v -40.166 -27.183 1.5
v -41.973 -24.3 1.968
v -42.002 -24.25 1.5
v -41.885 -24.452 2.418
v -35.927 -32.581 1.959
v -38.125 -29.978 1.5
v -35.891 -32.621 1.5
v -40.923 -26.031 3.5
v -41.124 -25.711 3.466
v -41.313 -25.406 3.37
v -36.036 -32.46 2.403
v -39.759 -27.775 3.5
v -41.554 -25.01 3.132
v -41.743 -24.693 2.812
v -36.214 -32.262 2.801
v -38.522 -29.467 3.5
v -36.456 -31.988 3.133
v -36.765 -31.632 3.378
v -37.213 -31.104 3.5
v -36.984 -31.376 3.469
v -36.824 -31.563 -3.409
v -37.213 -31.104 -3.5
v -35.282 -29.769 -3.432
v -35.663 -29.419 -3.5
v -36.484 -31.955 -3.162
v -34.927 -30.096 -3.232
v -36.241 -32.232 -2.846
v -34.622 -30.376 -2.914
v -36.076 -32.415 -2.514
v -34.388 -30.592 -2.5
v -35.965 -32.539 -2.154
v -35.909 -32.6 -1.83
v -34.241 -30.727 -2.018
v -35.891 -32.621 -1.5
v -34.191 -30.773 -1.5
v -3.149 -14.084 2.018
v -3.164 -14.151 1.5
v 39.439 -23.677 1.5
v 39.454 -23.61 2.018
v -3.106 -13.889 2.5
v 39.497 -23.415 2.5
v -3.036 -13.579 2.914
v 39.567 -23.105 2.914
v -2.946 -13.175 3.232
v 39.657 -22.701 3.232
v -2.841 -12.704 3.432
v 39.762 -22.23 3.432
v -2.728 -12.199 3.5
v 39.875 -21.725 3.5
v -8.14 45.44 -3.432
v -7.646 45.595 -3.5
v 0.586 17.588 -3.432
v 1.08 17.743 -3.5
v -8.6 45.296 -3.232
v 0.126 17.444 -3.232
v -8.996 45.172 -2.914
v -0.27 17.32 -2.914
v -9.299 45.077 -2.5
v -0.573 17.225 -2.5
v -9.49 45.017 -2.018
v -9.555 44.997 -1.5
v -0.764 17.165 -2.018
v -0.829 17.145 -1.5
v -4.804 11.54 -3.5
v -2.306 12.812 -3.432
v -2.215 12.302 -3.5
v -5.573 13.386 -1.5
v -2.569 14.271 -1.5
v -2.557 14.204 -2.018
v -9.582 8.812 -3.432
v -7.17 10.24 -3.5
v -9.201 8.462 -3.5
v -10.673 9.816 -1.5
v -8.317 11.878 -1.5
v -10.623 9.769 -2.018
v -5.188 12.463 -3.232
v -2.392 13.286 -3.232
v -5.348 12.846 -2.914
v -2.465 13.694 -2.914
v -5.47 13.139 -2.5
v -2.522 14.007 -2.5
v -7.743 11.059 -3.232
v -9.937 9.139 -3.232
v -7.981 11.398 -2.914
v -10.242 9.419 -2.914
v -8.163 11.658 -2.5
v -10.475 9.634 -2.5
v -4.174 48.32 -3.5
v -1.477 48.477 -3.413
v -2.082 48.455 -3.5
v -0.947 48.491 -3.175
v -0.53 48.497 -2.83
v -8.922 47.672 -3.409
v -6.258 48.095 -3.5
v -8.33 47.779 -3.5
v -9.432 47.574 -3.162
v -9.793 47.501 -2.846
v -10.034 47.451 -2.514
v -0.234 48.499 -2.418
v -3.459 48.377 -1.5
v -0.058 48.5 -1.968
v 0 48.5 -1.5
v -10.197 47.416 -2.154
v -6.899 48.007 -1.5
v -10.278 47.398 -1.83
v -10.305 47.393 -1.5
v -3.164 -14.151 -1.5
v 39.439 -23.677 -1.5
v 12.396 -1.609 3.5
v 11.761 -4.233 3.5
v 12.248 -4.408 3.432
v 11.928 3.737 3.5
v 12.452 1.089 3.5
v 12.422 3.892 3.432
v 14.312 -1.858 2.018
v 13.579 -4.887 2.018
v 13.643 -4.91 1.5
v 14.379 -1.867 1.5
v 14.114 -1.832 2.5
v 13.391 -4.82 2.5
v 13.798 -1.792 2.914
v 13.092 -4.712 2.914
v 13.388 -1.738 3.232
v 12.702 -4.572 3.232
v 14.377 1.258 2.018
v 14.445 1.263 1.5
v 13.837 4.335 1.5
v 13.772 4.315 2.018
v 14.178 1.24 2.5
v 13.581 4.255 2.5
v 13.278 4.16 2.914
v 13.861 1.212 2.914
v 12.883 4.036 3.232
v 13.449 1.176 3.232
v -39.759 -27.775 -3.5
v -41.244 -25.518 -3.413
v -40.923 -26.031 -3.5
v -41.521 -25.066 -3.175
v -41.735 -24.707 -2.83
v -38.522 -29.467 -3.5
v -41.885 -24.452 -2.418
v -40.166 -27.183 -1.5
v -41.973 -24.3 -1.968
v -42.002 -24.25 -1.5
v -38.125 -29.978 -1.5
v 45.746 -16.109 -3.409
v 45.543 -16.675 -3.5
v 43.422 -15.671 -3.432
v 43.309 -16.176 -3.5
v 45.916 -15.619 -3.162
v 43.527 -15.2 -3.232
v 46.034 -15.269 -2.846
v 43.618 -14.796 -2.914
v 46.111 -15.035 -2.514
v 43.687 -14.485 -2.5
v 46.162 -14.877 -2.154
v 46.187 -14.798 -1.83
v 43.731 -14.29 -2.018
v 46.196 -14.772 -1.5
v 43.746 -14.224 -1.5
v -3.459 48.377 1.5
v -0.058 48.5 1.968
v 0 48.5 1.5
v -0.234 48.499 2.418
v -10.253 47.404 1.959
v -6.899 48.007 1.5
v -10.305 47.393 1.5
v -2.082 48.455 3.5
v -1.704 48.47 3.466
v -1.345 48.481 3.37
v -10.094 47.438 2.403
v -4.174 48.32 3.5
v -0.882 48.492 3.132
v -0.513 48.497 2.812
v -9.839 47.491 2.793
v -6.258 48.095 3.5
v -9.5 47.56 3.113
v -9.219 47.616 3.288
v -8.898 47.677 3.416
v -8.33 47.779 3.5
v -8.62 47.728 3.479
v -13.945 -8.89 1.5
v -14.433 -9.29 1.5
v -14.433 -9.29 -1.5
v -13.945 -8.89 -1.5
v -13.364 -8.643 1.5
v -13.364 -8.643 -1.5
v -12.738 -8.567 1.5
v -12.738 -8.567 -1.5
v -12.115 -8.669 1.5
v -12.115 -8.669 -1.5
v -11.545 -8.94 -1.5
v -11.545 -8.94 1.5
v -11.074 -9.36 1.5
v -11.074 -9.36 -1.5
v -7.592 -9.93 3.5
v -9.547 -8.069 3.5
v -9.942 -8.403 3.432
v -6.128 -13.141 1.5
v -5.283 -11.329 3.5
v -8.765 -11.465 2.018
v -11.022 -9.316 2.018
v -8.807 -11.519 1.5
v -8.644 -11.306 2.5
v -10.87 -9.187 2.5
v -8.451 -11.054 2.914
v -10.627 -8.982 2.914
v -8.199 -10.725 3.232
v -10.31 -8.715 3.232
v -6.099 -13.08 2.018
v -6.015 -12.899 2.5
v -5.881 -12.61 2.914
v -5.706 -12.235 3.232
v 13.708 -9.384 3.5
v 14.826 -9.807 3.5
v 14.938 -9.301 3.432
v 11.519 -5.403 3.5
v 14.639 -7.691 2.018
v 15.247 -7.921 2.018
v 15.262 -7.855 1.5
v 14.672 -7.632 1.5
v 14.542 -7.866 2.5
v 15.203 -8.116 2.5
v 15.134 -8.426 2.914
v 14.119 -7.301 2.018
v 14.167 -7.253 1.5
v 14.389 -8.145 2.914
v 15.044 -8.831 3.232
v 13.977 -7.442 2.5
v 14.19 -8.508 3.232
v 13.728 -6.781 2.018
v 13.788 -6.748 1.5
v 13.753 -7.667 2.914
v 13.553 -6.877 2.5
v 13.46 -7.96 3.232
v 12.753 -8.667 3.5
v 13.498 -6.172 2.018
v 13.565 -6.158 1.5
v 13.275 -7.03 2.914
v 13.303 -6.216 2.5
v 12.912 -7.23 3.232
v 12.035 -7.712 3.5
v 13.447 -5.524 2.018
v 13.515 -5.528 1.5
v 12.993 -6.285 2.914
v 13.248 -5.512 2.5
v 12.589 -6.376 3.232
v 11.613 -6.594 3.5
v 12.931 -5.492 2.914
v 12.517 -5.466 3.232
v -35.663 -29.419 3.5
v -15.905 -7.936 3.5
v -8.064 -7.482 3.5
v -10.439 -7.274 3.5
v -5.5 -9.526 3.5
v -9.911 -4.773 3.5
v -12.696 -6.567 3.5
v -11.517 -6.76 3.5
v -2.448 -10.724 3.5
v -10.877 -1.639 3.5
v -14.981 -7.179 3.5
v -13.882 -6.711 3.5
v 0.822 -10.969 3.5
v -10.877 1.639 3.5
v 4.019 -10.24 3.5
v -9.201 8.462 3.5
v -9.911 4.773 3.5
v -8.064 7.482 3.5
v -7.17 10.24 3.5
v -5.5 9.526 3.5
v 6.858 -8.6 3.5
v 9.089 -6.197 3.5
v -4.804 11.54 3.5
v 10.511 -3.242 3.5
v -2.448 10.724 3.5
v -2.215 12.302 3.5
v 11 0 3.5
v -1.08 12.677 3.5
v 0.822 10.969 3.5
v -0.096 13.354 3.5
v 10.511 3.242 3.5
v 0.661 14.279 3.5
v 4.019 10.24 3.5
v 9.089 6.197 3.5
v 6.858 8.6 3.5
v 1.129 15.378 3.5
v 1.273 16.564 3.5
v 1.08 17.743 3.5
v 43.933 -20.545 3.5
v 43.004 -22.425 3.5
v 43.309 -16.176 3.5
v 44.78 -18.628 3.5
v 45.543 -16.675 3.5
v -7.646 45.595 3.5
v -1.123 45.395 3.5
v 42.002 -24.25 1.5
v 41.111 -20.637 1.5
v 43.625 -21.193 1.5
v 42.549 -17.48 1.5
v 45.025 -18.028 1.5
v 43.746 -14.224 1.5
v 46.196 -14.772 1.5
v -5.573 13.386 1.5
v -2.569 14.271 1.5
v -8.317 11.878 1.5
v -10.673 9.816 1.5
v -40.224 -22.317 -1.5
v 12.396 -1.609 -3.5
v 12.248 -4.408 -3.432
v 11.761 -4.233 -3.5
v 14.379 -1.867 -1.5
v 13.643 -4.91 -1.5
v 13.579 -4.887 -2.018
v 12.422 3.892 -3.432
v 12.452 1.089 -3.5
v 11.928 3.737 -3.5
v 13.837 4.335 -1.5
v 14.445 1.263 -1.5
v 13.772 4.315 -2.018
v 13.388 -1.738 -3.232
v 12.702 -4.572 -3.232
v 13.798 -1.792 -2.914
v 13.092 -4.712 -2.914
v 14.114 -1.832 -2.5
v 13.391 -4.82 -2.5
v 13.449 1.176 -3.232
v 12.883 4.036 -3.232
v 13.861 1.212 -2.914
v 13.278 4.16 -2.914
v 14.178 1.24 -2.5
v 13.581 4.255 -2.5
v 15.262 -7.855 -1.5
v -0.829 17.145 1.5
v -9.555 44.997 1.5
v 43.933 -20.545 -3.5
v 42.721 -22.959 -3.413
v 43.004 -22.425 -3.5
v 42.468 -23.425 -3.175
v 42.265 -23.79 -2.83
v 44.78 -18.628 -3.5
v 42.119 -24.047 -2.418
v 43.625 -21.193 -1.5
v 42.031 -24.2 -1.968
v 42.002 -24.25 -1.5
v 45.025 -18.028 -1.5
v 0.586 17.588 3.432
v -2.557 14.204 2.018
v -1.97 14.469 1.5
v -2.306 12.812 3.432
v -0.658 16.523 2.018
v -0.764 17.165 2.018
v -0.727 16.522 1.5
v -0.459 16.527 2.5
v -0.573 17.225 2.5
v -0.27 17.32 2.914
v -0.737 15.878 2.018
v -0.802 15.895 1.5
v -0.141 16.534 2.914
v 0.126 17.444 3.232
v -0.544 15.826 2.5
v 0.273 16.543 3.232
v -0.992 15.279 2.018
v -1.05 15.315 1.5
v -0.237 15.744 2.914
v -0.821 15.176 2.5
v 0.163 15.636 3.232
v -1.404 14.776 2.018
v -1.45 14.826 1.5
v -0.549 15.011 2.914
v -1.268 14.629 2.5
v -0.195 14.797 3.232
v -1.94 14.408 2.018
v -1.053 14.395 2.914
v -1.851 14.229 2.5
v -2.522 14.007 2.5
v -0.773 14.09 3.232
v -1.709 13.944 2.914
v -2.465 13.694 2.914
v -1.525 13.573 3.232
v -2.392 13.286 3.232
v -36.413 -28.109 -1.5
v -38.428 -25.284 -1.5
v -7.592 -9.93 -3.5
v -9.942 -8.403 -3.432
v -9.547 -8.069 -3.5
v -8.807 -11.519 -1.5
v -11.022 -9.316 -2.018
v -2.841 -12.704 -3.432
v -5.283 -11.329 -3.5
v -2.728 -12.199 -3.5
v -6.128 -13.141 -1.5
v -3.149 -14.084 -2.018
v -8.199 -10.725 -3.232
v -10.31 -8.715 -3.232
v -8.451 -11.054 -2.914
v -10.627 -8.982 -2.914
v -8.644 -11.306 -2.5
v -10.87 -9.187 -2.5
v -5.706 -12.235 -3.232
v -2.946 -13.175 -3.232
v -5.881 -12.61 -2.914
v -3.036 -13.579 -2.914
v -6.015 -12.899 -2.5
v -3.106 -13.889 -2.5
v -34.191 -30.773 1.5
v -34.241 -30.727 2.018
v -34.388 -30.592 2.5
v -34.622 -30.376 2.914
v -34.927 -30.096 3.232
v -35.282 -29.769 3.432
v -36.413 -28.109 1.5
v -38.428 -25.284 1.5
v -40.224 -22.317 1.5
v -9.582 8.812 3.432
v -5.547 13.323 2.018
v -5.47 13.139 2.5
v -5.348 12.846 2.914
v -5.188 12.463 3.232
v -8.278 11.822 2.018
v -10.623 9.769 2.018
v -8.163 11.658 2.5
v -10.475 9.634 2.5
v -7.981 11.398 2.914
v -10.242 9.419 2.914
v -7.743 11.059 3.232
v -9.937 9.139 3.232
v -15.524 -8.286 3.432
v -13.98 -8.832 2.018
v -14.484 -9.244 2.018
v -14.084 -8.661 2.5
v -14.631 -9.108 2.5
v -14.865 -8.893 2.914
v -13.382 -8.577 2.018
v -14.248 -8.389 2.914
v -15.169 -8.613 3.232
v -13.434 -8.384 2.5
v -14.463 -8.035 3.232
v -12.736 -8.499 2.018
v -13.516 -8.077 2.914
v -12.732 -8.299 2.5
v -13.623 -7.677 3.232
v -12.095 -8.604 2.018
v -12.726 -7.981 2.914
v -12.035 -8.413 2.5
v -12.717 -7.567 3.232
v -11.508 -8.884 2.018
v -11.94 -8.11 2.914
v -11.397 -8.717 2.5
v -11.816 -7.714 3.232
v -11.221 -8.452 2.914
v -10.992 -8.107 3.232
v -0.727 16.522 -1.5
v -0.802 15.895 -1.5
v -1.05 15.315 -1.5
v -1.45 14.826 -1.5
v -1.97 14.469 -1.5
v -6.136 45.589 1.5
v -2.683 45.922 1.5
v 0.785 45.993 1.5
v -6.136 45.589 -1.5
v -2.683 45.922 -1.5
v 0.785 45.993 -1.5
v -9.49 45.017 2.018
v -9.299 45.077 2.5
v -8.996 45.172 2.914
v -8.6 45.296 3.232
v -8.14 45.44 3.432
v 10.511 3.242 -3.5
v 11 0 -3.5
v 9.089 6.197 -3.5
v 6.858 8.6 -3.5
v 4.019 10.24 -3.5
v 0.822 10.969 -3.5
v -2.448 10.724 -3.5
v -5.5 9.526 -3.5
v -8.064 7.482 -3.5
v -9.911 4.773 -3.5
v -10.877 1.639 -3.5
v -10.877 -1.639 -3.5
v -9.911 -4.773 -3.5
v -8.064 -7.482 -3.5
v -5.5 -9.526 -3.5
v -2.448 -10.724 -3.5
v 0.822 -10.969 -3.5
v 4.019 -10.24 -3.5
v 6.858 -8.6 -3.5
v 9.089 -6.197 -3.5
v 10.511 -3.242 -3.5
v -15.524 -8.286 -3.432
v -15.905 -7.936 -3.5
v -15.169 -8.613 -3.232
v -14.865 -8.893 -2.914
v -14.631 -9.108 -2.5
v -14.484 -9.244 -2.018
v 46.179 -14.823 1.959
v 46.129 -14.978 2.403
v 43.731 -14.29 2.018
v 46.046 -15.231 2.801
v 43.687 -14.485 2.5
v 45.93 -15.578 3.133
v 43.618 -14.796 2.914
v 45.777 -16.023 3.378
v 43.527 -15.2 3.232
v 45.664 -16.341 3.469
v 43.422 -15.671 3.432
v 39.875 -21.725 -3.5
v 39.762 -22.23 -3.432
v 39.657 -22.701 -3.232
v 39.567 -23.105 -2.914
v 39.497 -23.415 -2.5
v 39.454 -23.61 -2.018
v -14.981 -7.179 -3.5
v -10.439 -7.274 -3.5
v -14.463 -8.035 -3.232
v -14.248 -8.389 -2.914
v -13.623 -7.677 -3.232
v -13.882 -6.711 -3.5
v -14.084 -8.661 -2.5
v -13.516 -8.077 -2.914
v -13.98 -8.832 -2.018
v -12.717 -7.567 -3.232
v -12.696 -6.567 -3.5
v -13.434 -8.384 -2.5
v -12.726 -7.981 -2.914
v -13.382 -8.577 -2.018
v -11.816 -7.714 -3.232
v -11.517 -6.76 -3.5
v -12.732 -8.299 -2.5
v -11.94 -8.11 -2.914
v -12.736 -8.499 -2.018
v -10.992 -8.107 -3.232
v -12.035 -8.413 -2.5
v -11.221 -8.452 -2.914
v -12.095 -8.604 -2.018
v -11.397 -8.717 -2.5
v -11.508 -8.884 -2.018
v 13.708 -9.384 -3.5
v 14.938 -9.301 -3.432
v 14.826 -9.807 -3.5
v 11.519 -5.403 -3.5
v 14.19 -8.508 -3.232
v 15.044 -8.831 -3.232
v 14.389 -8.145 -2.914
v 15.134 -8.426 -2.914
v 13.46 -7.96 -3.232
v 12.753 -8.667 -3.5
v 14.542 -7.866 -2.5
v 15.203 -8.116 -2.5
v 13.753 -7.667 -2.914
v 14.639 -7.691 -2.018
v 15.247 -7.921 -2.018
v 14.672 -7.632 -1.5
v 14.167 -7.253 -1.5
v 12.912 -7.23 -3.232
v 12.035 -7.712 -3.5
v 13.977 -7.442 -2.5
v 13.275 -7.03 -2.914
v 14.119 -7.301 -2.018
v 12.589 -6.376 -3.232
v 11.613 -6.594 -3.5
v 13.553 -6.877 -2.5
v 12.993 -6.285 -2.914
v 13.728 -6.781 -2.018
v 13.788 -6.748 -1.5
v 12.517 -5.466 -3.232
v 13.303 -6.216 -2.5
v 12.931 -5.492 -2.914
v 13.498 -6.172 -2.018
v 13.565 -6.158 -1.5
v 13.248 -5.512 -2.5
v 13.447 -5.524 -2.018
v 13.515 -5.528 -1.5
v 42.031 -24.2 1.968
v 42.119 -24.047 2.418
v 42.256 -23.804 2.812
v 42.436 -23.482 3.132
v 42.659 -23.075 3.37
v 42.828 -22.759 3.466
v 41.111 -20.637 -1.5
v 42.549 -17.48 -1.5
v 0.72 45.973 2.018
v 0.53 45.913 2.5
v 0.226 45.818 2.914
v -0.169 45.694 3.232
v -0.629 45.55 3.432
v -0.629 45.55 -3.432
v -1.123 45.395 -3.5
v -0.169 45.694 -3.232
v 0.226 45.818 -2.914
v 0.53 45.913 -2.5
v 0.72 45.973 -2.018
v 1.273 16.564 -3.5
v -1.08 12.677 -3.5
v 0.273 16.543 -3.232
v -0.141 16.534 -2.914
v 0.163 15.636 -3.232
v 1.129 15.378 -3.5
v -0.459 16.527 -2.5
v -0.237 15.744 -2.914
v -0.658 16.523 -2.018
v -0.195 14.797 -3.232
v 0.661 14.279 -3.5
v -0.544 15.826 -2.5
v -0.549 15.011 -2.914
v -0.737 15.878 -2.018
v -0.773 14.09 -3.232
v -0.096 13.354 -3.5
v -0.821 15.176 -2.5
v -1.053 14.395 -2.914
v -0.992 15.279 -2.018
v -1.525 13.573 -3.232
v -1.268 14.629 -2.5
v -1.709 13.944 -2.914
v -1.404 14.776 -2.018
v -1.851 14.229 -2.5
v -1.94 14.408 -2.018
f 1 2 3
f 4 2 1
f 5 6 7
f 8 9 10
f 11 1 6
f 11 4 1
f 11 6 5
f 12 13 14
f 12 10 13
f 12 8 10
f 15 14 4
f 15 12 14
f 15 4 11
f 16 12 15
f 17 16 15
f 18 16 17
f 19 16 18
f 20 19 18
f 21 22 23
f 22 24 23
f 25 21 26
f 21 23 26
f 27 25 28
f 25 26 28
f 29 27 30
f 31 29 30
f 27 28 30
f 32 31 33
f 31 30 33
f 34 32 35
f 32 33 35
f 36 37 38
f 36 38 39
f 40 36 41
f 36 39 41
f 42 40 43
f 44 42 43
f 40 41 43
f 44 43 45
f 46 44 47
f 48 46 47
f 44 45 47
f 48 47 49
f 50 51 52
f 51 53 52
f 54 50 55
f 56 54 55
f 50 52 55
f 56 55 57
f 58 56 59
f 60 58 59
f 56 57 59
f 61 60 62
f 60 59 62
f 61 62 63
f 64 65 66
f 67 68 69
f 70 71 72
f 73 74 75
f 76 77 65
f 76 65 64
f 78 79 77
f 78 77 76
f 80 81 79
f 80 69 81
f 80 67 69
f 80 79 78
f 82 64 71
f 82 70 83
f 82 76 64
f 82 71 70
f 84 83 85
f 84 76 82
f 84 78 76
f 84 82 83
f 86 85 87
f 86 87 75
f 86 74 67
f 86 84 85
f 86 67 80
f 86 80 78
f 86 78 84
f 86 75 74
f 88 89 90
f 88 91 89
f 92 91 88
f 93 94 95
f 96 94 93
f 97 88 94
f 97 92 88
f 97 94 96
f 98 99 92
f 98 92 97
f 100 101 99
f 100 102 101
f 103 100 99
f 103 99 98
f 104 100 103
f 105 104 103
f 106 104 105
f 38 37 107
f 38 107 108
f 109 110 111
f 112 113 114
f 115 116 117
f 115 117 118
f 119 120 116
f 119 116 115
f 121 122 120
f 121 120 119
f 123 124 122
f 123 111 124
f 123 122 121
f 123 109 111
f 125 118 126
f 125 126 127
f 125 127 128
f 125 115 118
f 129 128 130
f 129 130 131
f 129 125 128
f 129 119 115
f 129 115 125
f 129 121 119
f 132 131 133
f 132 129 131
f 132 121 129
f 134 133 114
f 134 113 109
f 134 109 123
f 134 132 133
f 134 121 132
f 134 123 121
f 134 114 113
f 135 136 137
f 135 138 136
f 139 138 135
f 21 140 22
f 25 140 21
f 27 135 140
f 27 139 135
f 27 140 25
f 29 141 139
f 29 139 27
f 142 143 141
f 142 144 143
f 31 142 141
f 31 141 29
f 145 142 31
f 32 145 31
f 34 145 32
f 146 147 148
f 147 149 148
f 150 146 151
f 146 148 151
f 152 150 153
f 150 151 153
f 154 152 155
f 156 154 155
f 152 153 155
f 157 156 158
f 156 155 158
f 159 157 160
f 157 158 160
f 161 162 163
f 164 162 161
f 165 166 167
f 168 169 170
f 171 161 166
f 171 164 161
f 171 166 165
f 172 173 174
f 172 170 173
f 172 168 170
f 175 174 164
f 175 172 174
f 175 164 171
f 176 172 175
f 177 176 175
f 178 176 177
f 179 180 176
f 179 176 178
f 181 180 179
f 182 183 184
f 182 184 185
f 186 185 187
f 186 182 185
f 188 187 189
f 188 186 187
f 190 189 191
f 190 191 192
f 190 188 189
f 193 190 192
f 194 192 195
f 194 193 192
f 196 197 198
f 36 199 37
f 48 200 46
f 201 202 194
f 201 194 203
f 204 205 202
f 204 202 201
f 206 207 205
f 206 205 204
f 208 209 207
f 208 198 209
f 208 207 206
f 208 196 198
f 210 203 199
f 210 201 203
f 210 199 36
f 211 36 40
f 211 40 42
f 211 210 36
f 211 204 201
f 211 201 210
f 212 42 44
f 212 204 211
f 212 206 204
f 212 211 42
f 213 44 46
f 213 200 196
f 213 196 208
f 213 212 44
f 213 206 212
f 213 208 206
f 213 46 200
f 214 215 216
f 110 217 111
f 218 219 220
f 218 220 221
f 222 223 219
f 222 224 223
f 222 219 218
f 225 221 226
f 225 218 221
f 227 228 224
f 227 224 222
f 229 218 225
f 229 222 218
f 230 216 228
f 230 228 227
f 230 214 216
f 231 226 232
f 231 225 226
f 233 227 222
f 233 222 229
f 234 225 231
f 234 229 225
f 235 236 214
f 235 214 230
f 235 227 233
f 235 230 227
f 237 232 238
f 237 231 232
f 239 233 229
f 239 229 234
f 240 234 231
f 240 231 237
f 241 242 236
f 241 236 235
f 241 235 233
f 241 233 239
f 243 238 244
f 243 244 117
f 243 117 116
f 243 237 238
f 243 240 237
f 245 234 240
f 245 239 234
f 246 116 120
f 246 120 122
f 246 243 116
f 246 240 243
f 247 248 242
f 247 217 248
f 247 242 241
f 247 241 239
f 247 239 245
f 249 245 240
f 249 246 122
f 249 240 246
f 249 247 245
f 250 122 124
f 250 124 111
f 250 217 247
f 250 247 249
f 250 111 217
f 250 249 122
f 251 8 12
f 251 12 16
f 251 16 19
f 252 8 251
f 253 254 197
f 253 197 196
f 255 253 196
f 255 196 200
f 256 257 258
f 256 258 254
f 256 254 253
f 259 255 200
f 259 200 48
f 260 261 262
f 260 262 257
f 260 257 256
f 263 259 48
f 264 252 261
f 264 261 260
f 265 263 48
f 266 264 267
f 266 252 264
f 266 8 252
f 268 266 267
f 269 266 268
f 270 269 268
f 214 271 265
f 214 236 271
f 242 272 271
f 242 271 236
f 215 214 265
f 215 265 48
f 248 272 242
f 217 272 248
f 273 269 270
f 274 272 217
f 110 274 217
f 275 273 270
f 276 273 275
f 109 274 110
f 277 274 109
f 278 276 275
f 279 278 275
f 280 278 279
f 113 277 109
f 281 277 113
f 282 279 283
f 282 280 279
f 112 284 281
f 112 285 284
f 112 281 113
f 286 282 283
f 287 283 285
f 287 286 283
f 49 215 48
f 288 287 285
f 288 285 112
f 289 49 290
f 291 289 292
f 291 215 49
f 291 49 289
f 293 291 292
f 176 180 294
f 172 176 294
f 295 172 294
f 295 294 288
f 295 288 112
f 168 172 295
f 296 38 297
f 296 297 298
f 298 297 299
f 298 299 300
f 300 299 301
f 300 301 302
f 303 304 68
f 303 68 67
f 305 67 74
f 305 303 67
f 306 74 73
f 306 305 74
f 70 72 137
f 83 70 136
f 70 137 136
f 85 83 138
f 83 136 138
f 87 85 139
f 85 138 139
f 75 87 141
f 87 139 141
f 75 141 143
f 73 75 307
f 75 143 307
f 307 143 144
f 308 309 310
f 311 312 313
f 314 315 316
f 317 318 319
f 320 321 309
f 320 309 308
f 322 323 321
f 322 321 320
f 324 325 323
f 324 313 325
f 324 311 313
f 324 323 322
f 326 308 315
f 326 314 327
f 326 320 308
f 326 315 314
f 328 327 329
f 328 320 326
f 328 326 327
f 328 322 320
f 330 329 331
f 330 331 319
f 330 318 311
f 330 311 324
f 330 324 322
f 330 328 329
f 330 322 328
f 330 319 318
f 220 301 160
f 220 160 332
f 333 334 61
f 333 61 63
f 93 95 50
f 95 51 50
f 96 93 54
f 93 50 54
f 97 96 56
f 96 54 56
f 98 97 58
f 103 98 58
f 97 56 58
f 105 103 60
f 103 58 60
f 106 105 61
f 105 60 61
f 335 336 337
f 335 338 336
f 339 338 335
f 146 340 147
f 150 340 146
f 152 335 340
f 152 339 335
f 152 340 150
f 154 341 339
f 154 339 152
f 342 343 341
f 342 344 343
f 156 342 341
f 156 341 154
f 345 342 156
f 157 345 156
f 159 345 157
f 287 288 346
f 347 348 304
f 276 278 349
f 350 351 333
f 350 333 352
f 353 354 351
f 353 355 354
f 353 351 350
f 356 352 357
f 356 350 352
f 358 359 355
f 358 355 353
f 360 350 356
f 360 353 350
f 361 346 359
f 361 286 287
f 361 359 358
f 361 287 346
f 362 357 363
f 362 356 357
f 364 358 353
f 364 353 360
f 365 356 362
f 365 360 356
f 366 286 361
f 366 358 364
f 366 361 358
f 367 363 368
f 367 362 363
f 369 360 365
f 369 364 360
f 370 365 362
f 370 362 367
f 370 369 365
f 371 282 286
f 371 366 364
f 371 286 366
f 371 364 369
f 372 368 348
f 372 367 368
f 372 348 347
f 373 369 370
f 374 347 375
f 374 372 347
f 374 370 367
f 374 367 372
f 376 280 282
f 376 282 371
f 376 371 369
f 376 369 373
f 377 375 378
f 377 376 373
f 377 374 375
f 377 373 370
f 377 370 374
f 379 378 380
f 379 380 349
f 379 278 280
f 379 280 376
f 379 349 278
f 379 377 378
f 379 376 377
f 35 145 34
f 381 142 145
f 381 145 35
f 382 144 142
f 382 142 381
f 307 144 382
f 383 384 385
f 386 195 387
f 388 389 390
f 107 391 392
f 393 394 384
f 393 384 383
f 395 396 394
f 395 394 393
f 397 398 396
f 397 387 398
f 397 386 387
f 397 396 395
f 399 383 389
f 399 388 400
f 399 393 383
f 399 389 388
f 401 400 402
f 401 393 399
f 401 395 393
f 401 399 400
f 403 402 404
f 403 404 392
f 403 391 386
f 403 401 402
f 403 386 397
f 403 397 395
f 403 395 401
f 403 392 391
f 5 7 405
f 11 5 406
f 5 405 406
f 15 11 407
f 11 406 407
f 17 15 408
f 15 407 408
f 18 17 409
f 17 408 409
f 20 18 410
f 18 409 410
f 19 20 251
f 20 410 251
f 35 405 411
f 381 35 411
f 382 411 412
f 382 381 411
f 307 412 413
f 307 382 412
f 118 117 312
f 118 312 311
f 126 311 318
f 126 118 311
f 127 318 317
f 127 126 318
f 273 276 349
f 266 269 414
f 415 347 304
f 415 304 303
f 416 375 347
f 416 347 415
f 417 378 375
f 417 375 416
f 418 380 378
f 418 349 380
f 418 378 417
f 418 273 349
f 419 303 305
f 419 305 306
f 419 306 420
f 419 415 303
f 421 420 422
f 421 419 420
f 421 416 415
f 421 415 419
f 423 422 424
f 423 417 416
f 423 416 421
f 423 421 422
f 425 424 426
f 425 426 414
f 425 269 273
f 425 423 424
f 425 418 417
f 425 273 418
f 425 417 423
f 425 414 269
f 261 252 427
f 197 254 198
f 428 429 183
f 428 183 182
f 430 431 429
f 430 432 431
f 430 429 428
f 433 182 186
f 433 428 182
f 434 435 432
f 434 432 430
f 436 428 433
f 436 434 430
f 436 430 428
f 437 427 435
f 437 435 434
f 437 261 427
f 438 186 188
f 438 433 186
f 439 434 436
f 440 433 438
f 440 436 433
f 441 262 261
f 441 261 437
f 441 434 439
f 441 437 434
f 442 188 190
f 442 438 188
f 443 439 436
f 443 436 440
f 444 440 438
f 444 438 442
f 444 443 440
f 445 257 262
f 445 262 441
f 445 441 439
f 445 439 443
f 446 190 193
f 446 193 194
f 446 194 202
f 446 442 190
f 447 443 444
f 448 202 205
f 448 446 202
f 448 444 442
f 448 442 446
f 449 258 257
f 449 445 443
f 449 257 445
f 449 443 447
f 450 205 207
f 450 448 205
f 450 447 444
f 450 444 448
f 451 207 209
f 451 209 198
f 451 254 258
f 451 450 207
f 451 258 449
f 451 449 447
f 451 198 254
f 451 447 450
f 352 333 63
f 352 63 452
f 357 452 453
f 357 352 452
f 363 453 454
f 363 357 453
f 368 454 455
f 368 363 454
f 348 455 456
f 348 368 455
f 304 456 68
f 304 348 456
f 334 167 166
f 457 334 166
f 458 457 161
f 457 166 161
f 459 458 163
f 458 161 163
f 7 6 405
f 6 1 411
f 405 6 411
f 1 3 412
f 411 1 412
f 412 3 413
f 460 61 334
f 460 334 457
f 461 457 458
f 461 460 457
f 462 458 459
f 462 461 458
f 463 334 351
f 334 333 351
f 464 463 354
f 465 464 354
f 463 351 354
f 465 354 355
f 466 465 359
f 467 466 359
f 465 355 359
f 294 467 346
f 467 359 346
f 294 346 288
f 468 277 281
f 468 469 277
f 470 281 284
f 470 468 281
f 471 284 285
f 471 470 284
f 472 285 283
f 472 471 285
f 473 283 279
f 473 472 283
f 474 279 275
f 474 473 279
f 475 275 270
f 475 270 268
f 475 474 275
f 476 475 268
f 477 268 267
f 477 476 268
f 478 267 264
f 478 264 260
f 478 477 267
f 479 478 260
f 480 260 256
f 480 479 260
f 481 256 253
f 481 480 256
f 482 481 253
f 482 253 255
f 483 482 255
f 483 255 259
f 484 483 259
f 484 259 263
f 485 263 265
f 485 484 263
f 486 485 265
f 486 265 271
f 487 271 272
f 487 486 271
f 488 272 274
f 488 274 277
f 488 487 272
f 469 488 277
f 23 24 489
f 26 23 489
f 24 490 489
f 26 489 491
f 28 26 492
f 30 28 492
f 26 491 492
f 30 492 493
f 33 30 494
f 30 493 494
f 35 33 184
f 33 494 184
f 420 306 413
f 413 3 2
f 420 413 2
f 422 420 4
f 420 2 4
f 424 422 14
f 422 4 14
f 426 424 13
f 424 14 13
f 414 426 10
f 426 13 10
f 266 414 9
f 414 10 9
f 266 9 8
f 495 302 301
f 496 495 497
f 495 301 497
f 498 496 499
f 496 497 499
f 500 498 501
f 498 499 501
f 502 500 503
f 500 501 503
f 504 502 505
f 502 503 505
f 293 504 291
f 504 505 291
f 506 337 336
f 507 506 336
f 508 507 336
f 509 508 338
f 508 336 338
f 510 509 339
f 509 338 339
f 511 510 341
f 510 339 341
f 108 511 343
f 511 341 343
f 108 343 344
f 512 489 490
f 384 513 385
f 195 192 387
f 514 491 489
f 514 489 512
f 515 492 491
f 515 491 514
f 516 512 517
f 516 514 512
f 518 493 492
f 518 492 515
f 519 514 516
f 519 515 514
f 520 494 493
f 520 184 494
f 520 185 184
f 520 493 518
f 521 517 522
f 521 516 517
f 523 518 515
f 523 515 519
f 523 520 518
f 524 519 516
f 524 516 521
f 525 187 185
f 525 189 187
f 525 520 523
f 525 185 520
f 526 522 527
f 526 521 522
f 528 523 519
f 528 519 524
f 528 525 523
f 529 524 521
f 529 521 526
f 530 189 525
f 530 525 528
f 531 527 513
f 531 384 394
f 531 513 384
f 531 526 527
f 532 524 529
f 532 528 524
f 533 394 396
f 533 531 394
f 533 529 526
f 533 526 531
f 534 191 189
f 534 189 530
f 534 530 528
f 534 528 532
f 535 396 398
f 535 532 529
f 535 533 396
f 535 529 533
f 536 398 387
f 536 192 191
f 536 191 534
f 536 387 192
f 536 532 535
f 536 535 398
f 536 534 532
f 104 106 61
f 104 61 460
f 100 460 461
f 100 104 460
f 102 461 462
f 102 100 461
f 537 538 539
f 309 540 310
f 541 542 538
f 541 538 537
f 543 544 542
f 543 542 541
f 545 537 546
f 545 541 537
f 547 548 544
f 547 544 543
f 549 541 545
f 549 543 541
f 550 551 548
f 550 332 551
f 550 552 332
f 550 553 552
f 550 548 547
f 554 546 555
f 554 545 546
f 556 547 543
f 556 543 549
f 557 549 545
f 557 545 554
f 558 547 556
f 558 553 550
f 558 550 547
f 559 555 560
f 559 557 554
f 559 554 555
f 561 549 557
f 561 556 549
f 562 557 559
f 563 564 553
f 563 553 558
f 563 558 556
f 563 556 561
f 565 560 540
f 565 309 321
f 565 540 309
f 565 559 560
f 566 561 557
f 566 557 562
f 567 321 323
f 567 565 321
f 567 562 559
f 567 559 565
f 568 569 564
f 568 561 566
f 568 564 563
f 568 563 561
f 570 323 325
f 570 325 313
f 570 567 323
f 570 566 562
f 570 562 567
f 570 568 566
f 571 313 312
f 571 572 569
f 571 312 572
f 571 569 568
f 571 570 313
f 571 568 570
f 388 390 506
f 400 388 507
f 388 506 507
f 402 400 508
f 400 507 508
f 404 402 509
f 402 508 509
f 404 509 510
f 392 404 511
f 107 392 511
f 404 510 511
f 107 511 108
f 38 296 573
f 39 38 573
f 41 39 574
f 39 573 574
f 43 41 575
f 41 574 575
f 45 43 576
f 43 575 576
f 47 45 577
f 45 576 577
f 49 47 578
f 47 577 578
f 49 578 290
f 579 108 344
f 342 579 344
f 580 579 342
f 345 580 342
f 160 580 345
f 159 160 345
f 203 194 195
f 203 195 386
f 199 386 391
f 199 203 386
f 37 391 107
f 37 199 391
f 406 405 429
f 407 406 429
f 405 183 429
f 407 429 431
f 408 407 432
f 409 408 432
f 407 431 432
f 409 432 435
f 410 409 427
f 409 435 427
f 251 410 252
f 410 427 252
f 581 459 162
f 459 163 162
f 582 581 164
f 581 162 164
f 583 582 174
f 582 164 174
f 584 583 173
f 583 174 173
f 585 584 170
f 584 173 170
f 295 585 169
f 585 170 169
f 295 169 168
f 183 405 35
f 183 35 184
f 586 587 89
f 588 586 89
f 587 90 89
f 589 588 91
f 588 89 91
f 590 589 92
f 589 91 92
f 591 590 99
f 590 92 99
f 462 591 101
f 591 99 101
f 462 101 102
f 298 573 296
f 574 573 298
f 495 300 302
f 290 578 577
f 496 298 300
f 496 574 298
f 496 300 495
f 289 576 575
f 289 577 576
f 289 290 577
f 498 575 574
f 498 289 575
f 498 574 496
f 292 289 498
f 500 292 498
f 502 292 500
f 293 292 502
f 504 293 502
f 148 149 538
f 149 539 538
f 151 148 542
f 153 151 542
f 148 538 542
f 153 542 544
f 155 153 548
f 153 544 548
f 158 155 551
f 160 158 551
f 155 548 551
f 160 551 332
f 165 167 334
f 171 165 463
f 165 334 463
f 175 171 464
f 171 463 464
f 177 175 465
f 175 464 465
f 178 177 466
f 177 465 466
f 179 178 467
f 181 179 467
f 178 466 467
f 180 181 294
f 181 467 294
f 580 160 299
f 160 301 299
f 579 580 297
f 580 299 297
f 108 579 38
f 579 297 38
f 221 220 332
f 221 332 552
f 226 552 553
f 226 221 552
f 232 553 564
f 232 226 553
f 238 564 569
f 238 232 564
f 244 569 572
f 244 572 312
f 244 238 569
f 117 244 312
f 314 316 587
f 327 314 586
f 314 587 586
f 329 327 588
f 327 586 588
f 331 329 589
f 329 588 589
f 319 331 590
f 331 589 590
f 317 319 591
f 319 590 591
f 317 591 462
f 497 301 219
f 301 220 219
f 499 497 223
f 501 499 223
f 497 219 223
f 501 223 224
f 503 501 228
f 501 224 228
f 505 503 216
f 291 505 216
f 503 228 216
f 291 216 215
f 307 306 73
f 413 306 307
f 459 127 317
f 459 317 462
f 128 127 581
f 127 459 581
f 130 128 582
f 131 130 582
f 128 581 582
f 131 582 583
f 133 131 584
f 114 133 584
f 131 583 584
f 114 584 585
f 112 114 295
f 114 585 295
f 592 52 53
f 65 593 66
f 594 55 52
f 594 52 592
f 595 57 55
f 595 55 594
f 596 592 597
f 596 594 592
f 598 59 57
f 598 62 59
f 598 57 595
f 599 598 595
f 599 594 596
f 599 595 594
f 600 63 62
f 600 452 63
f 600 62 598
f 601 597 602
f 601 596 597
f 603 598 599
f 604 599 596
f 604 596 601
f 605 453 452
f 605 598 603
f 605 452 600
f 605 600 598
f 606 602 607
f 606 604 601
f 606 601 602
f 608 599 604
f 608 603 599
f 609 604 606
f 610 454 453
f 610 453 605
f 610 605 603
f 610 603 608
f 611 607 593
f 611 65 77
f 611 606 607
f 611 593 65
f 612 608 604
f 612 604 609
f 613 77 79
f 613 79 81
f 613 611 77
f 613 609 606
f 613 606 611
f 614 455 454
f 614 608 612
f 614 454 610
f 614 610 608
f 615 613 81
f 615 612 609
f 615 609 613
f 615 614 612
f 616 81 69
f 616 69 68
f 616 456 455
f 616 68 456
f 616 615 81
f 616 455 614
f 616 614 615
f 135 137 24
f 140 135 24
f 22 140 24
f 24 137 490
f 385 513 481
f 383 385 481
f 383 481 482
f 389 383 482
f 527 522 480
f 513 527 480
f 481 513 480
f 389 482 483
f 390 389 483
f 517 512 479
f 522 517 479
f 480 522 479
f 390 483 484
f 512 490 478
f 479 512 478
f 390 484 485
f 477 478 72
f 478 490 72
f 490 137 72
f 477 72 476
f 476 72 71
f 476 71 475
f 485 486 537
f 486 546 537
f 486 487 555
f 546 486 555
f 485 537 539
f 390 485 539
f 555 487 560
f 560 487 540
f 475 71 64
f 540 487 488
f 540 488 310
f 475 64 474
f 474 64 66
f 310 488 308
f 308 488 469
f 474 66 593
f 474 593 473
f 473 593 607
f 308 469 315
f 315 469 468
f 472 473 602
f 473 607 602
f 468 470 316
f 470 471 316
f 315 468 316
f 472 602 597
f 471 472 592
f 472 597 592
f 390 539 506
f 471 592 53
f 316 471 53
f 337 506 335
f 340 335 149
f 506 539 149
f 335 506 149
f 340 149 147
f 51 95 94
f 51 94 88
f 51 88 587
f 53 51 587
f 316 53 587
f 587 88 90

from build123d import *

# Parameters (mm, degrees)
F0_R     = 11
F1_DEPTH = 3.5
F2_R     = 2
F3_R     = 2
F4_DEPTH = 1.5


with BuildPart() as f1:
    # F0 (on Top) → F1 (new body, symmetric)
    with BuildSketch(Plane.XY):
        with BuildLine():
            ThreePointArc((-0.8285496132, 17.1446015607), (-1.0500524725, 15.314704152), (-2.5690728422, 14.2705944071))
            ThreePointArc((-2.5690728422, 14.2705944071), (-6.985549163, 12.7063804009), (-10.6726700751, 9.8155037297))
            Line((-10.6726700751, 9.8155037297), (-40.2240356418, -22.3165175753))
            ThreePointArc((-40.2240356418, -22.3165175753), (-37.447016124, -26.7155569548), (-34.1910537852, -30.7729075821))
            Line((-34.1910537852, -30.7729075821), (-14.4333856827, -9.2898457936))
            ThreePointArc((-14.4333856827, -9.2898457936), (-12.7378966108, -8.5667241925), (-11.0741608625, -9.3601795491))
            ThreePointArc((-11.0741608625, -9.3601795491), (-7.5112736358, -12.4028532349), (-3.1641405433, -14.1505552761))
            Line((-3.1641405433, -14.1505552761), (39.4386889651, -23.6767779209))
            ThreePointArc((39.4386889651, -23.6767779209), (41.8598590611, -19.0722887819), (43.745646607, -14.2238673691))
            Line((43.745646607, -14.2238673691), (15.2619352959, -7.8547557671))
            ThreePointArc((15.2619352959, -7.8547557671), (13.7879490833, -6.7479799595), (13.6432337047, -4.910414858))
            ThreePointArc((13.6432337047, -4.910414858), (14.4968227988, -0.3035271659), (13.8368106184, 4.3350515464))
            Line((13.8368106184, 4.3350515464), (0.7853466767, 45.9932954962))
            ThreePointArc((0.7853466767, 45.9932954962), (-4.4128429371, 45.7878457368), (-9.5545928219, 44.9967749512))
            Line((-9.5545928219, 44.9967749512), (-0.8285496132, 17.1446015607))
        make_face()
        Circle(F0_R, mode=Mode.SUBTRACT)
        with BuildLine():
            Line((-10.3051834804, 47.3925436481), (-9.5545928219, 44.9967749512))
            ThreePointArc((-9.5545928219, 44.9967749512), (-4.4128429371, 45.7878457368), (0.7853466767, 45.9932954962))
            Line((0.7853466767, 45.9932954962), (0, 48.5))
            ThreePointArc((0, 48.5), (-5.1822597903, 48.2223411239), (-10.3051834804, 47.3925436481))
        make_face()
        with BuildLine():
            ThreePointArc((43.745646607, -14.2238673691), (41.8598590611, -19.0722887819), (39.4386889651, -23.6767779209))
            Line((39.4386889651, -23.6767779209), (42.0022320835, -24.25))
            ThreePointArc((42.0022320835, -24.25), (44.3529023384, -19.6232019345), (46.1957384894, -14.7717211394))
            Line((46.1957384894, -14.7717211394), (43.745646607, -14.2238673691))
        make_face()
        with BuildLine():
            ThreePointArc((-34.1910537852, -30.7729075821), (-37.447016124, -26.7155569548), (-40.2240356418, -22.3165175753))
            Line((-40.2240356418, -22.3165175753), (-42.0022320835, -24.25))
            ThreePointArc((-42.0022320835, -24.25), (-39.1706425481, -28.5991391893), (-35.890555009, -32.6208225087))
            Line((-35.890555009, -32.6208225087), (-34.1910537852, -30.7729075821))
        make_face()
    extrude(amount=F1_DEPTH, both=True)

    # F2
    f2_edges = [f1.edges().sort_by_distance(p)[0] for p in [
        (-26.337451, -7.217248, 3.5),
        (-6.985549, 12.70638, 3.5),
        (-1.050052, 15.314704, 3.5),
        (-5.566867, 32.268573, 3.5),
        (6.918405, 26.417526, 3.5),
        (14.496823, -0.303527, 3.5),
        (13.787949, -6.74798, 3.5),
        (30.728837, -11.313238, 3.5),
        (19.419046, -19.200278, 3.5),
        (-7.511274, -12.402853, 3.5),
        (-12.737897, -8.566724, 3.5),
        (-25.16197, -20.955334, 3.5),
    ]]
    fillet(f2_edges, radius=F2_R)

    # F3
    f3_edges = [f1.edges().sort_by_distance(p)[0] for p in [
        (-26.337451, -7.217248, -3.5),
        (-6.985549, 12.70638, -3.5),
        (-1.050052, 15.314704, -3.5),
        (-5.566867, 32.268573, -3.5),
        (6.918405, 26.417526, -3.5),
        (14.496823, -0.303527, -3.5),
        (13.787949, -6.74798, -3.5),
        (30.728837, -11.313238, -3.5),
        (19.419046, -19.200278, -3.5),
        (-7.511274, -12.402853, -3.5),
        (-12.737897, -8.566724, -3.5),
        (-25.16197, -20.955334, -3.5),
    ]]
    fillet(f3_edges, radius=F3_R)


with BuildPart() as f4:
    # F0 (on Top) → F4 (new body, symmetric)
    with BuildSketch(Plane.XY):
        with BuildLine():
            Line((-10.3051834804, 47.3925436481), (-9.5545928219, 44.9967749512))
            ThreePointArc((-9.5545928219, 44.9967749512), (-4.4128429371, 45.7878457368), (0.7853466767, 45.9932954962))
            Line((0.7853466767, 45.9932954962), (0, 48.5))
            ThreePointArc((0, 48.5), (-5.1822597903, 48.2223411239), (-10.3051834804, 47.3925436481))
        make_face()
        with BuildLine():
            Line((-42.0022320835, -24.25), (-40.2240356418, -22.3165175753))
            ThreePointArc((-40.2240356418, -22.3165175753), (-41.8598590611, 19.0722887819), (-9.5545928219, 44.9967749512))
            Line((-9.5545928219, 44.9967749512), (-10.3051834804, 47.3925436481))
            ThreePointArc((-10.3051834804, 47.3925436481), (-44.3529023384, 19.6232019345), (-42.0022320835, -24.25))
        make_face()
        with BuildLine():
            ThreePointArc((-34.1910537852, -30.7729075821), (-37.447016124, -26.7155569548), (-40.2240356418, -22.3165175753))
            Line((-40.2240356418, -22.3165175753), (-42.0022320835, -24.25))
            ThreePointArc((-42.0022320835, -24.25), (-39.1706425481, -28.5991391893), (-35.890555009, -32.6208225087))
            Line((-35.890555009, -32.6208225087), (-34.1910537852, -30.7729075821))
        make_face()
        with BuildLine():
            ThreePointArc((39.4386889651, -23.6767779209), (4.4128429371, -45.7878457368), (-34.1910537852, -30.7729075821))
            Line((-34.1910537852, -30.7729075821), (-35.890555009, -32.6208225087))
            ThreePointArc((-35.890555009, -32.6208225087), (5.1822597903, -48.2223411239), (42.0022320835, -24.25))
            Line((42.0022320835, -24.25), (39.4386889651, -23.6767779209))
        make_face()
        with BuildLine():
            ThreePointArc((43.745646607, -14.2238673691), (41.8598590611, -19.0722887819), (39.4386889651, -23.6767779209))
            Line((39.4386889651, -23.6767779209), (42.0022320835, -24.25))
            ThreePointArc((42.0022320835, -24.25), (44.3529023384, -19.6232019345), (46.1957384894, -14.7717211394))
            Line((46.1957384894, -14.7717211394), (43.745646607, -14.2238673691))
        make_face()
        with BuildLine():
            Line((0, 48.5), (0.7853466767, 45.9932954962))
            ThreePointArc((0.7853466767, 45.9932954962), (32.8033988112, 32.2480546147), (46, 0))
            ThreePointArc((46, 0), (45.4329161728, -7.2007033016), (43.745646607, -14.2238673691))
            Line((43.745646607, -14.2238673691), (46.1957384894, -14.7717211394))
            ThreePointArc((46.1957384894, -14.7717211394), (47.9204722261, -7.4751817123), (48.5, 0))
            ThreePointArc((48.5, 0), (34.2946788875, 34.2946788875), (0, 48.5))
        make_face()
    extrude(amount=F4_DEPTH, both=True)


with BuildPart() as f1_1:
    add(f1.part)

    # F5: cut F4
    add(f4.part, mode=Mode.SUBTRACT)


solid = f1_1.part
